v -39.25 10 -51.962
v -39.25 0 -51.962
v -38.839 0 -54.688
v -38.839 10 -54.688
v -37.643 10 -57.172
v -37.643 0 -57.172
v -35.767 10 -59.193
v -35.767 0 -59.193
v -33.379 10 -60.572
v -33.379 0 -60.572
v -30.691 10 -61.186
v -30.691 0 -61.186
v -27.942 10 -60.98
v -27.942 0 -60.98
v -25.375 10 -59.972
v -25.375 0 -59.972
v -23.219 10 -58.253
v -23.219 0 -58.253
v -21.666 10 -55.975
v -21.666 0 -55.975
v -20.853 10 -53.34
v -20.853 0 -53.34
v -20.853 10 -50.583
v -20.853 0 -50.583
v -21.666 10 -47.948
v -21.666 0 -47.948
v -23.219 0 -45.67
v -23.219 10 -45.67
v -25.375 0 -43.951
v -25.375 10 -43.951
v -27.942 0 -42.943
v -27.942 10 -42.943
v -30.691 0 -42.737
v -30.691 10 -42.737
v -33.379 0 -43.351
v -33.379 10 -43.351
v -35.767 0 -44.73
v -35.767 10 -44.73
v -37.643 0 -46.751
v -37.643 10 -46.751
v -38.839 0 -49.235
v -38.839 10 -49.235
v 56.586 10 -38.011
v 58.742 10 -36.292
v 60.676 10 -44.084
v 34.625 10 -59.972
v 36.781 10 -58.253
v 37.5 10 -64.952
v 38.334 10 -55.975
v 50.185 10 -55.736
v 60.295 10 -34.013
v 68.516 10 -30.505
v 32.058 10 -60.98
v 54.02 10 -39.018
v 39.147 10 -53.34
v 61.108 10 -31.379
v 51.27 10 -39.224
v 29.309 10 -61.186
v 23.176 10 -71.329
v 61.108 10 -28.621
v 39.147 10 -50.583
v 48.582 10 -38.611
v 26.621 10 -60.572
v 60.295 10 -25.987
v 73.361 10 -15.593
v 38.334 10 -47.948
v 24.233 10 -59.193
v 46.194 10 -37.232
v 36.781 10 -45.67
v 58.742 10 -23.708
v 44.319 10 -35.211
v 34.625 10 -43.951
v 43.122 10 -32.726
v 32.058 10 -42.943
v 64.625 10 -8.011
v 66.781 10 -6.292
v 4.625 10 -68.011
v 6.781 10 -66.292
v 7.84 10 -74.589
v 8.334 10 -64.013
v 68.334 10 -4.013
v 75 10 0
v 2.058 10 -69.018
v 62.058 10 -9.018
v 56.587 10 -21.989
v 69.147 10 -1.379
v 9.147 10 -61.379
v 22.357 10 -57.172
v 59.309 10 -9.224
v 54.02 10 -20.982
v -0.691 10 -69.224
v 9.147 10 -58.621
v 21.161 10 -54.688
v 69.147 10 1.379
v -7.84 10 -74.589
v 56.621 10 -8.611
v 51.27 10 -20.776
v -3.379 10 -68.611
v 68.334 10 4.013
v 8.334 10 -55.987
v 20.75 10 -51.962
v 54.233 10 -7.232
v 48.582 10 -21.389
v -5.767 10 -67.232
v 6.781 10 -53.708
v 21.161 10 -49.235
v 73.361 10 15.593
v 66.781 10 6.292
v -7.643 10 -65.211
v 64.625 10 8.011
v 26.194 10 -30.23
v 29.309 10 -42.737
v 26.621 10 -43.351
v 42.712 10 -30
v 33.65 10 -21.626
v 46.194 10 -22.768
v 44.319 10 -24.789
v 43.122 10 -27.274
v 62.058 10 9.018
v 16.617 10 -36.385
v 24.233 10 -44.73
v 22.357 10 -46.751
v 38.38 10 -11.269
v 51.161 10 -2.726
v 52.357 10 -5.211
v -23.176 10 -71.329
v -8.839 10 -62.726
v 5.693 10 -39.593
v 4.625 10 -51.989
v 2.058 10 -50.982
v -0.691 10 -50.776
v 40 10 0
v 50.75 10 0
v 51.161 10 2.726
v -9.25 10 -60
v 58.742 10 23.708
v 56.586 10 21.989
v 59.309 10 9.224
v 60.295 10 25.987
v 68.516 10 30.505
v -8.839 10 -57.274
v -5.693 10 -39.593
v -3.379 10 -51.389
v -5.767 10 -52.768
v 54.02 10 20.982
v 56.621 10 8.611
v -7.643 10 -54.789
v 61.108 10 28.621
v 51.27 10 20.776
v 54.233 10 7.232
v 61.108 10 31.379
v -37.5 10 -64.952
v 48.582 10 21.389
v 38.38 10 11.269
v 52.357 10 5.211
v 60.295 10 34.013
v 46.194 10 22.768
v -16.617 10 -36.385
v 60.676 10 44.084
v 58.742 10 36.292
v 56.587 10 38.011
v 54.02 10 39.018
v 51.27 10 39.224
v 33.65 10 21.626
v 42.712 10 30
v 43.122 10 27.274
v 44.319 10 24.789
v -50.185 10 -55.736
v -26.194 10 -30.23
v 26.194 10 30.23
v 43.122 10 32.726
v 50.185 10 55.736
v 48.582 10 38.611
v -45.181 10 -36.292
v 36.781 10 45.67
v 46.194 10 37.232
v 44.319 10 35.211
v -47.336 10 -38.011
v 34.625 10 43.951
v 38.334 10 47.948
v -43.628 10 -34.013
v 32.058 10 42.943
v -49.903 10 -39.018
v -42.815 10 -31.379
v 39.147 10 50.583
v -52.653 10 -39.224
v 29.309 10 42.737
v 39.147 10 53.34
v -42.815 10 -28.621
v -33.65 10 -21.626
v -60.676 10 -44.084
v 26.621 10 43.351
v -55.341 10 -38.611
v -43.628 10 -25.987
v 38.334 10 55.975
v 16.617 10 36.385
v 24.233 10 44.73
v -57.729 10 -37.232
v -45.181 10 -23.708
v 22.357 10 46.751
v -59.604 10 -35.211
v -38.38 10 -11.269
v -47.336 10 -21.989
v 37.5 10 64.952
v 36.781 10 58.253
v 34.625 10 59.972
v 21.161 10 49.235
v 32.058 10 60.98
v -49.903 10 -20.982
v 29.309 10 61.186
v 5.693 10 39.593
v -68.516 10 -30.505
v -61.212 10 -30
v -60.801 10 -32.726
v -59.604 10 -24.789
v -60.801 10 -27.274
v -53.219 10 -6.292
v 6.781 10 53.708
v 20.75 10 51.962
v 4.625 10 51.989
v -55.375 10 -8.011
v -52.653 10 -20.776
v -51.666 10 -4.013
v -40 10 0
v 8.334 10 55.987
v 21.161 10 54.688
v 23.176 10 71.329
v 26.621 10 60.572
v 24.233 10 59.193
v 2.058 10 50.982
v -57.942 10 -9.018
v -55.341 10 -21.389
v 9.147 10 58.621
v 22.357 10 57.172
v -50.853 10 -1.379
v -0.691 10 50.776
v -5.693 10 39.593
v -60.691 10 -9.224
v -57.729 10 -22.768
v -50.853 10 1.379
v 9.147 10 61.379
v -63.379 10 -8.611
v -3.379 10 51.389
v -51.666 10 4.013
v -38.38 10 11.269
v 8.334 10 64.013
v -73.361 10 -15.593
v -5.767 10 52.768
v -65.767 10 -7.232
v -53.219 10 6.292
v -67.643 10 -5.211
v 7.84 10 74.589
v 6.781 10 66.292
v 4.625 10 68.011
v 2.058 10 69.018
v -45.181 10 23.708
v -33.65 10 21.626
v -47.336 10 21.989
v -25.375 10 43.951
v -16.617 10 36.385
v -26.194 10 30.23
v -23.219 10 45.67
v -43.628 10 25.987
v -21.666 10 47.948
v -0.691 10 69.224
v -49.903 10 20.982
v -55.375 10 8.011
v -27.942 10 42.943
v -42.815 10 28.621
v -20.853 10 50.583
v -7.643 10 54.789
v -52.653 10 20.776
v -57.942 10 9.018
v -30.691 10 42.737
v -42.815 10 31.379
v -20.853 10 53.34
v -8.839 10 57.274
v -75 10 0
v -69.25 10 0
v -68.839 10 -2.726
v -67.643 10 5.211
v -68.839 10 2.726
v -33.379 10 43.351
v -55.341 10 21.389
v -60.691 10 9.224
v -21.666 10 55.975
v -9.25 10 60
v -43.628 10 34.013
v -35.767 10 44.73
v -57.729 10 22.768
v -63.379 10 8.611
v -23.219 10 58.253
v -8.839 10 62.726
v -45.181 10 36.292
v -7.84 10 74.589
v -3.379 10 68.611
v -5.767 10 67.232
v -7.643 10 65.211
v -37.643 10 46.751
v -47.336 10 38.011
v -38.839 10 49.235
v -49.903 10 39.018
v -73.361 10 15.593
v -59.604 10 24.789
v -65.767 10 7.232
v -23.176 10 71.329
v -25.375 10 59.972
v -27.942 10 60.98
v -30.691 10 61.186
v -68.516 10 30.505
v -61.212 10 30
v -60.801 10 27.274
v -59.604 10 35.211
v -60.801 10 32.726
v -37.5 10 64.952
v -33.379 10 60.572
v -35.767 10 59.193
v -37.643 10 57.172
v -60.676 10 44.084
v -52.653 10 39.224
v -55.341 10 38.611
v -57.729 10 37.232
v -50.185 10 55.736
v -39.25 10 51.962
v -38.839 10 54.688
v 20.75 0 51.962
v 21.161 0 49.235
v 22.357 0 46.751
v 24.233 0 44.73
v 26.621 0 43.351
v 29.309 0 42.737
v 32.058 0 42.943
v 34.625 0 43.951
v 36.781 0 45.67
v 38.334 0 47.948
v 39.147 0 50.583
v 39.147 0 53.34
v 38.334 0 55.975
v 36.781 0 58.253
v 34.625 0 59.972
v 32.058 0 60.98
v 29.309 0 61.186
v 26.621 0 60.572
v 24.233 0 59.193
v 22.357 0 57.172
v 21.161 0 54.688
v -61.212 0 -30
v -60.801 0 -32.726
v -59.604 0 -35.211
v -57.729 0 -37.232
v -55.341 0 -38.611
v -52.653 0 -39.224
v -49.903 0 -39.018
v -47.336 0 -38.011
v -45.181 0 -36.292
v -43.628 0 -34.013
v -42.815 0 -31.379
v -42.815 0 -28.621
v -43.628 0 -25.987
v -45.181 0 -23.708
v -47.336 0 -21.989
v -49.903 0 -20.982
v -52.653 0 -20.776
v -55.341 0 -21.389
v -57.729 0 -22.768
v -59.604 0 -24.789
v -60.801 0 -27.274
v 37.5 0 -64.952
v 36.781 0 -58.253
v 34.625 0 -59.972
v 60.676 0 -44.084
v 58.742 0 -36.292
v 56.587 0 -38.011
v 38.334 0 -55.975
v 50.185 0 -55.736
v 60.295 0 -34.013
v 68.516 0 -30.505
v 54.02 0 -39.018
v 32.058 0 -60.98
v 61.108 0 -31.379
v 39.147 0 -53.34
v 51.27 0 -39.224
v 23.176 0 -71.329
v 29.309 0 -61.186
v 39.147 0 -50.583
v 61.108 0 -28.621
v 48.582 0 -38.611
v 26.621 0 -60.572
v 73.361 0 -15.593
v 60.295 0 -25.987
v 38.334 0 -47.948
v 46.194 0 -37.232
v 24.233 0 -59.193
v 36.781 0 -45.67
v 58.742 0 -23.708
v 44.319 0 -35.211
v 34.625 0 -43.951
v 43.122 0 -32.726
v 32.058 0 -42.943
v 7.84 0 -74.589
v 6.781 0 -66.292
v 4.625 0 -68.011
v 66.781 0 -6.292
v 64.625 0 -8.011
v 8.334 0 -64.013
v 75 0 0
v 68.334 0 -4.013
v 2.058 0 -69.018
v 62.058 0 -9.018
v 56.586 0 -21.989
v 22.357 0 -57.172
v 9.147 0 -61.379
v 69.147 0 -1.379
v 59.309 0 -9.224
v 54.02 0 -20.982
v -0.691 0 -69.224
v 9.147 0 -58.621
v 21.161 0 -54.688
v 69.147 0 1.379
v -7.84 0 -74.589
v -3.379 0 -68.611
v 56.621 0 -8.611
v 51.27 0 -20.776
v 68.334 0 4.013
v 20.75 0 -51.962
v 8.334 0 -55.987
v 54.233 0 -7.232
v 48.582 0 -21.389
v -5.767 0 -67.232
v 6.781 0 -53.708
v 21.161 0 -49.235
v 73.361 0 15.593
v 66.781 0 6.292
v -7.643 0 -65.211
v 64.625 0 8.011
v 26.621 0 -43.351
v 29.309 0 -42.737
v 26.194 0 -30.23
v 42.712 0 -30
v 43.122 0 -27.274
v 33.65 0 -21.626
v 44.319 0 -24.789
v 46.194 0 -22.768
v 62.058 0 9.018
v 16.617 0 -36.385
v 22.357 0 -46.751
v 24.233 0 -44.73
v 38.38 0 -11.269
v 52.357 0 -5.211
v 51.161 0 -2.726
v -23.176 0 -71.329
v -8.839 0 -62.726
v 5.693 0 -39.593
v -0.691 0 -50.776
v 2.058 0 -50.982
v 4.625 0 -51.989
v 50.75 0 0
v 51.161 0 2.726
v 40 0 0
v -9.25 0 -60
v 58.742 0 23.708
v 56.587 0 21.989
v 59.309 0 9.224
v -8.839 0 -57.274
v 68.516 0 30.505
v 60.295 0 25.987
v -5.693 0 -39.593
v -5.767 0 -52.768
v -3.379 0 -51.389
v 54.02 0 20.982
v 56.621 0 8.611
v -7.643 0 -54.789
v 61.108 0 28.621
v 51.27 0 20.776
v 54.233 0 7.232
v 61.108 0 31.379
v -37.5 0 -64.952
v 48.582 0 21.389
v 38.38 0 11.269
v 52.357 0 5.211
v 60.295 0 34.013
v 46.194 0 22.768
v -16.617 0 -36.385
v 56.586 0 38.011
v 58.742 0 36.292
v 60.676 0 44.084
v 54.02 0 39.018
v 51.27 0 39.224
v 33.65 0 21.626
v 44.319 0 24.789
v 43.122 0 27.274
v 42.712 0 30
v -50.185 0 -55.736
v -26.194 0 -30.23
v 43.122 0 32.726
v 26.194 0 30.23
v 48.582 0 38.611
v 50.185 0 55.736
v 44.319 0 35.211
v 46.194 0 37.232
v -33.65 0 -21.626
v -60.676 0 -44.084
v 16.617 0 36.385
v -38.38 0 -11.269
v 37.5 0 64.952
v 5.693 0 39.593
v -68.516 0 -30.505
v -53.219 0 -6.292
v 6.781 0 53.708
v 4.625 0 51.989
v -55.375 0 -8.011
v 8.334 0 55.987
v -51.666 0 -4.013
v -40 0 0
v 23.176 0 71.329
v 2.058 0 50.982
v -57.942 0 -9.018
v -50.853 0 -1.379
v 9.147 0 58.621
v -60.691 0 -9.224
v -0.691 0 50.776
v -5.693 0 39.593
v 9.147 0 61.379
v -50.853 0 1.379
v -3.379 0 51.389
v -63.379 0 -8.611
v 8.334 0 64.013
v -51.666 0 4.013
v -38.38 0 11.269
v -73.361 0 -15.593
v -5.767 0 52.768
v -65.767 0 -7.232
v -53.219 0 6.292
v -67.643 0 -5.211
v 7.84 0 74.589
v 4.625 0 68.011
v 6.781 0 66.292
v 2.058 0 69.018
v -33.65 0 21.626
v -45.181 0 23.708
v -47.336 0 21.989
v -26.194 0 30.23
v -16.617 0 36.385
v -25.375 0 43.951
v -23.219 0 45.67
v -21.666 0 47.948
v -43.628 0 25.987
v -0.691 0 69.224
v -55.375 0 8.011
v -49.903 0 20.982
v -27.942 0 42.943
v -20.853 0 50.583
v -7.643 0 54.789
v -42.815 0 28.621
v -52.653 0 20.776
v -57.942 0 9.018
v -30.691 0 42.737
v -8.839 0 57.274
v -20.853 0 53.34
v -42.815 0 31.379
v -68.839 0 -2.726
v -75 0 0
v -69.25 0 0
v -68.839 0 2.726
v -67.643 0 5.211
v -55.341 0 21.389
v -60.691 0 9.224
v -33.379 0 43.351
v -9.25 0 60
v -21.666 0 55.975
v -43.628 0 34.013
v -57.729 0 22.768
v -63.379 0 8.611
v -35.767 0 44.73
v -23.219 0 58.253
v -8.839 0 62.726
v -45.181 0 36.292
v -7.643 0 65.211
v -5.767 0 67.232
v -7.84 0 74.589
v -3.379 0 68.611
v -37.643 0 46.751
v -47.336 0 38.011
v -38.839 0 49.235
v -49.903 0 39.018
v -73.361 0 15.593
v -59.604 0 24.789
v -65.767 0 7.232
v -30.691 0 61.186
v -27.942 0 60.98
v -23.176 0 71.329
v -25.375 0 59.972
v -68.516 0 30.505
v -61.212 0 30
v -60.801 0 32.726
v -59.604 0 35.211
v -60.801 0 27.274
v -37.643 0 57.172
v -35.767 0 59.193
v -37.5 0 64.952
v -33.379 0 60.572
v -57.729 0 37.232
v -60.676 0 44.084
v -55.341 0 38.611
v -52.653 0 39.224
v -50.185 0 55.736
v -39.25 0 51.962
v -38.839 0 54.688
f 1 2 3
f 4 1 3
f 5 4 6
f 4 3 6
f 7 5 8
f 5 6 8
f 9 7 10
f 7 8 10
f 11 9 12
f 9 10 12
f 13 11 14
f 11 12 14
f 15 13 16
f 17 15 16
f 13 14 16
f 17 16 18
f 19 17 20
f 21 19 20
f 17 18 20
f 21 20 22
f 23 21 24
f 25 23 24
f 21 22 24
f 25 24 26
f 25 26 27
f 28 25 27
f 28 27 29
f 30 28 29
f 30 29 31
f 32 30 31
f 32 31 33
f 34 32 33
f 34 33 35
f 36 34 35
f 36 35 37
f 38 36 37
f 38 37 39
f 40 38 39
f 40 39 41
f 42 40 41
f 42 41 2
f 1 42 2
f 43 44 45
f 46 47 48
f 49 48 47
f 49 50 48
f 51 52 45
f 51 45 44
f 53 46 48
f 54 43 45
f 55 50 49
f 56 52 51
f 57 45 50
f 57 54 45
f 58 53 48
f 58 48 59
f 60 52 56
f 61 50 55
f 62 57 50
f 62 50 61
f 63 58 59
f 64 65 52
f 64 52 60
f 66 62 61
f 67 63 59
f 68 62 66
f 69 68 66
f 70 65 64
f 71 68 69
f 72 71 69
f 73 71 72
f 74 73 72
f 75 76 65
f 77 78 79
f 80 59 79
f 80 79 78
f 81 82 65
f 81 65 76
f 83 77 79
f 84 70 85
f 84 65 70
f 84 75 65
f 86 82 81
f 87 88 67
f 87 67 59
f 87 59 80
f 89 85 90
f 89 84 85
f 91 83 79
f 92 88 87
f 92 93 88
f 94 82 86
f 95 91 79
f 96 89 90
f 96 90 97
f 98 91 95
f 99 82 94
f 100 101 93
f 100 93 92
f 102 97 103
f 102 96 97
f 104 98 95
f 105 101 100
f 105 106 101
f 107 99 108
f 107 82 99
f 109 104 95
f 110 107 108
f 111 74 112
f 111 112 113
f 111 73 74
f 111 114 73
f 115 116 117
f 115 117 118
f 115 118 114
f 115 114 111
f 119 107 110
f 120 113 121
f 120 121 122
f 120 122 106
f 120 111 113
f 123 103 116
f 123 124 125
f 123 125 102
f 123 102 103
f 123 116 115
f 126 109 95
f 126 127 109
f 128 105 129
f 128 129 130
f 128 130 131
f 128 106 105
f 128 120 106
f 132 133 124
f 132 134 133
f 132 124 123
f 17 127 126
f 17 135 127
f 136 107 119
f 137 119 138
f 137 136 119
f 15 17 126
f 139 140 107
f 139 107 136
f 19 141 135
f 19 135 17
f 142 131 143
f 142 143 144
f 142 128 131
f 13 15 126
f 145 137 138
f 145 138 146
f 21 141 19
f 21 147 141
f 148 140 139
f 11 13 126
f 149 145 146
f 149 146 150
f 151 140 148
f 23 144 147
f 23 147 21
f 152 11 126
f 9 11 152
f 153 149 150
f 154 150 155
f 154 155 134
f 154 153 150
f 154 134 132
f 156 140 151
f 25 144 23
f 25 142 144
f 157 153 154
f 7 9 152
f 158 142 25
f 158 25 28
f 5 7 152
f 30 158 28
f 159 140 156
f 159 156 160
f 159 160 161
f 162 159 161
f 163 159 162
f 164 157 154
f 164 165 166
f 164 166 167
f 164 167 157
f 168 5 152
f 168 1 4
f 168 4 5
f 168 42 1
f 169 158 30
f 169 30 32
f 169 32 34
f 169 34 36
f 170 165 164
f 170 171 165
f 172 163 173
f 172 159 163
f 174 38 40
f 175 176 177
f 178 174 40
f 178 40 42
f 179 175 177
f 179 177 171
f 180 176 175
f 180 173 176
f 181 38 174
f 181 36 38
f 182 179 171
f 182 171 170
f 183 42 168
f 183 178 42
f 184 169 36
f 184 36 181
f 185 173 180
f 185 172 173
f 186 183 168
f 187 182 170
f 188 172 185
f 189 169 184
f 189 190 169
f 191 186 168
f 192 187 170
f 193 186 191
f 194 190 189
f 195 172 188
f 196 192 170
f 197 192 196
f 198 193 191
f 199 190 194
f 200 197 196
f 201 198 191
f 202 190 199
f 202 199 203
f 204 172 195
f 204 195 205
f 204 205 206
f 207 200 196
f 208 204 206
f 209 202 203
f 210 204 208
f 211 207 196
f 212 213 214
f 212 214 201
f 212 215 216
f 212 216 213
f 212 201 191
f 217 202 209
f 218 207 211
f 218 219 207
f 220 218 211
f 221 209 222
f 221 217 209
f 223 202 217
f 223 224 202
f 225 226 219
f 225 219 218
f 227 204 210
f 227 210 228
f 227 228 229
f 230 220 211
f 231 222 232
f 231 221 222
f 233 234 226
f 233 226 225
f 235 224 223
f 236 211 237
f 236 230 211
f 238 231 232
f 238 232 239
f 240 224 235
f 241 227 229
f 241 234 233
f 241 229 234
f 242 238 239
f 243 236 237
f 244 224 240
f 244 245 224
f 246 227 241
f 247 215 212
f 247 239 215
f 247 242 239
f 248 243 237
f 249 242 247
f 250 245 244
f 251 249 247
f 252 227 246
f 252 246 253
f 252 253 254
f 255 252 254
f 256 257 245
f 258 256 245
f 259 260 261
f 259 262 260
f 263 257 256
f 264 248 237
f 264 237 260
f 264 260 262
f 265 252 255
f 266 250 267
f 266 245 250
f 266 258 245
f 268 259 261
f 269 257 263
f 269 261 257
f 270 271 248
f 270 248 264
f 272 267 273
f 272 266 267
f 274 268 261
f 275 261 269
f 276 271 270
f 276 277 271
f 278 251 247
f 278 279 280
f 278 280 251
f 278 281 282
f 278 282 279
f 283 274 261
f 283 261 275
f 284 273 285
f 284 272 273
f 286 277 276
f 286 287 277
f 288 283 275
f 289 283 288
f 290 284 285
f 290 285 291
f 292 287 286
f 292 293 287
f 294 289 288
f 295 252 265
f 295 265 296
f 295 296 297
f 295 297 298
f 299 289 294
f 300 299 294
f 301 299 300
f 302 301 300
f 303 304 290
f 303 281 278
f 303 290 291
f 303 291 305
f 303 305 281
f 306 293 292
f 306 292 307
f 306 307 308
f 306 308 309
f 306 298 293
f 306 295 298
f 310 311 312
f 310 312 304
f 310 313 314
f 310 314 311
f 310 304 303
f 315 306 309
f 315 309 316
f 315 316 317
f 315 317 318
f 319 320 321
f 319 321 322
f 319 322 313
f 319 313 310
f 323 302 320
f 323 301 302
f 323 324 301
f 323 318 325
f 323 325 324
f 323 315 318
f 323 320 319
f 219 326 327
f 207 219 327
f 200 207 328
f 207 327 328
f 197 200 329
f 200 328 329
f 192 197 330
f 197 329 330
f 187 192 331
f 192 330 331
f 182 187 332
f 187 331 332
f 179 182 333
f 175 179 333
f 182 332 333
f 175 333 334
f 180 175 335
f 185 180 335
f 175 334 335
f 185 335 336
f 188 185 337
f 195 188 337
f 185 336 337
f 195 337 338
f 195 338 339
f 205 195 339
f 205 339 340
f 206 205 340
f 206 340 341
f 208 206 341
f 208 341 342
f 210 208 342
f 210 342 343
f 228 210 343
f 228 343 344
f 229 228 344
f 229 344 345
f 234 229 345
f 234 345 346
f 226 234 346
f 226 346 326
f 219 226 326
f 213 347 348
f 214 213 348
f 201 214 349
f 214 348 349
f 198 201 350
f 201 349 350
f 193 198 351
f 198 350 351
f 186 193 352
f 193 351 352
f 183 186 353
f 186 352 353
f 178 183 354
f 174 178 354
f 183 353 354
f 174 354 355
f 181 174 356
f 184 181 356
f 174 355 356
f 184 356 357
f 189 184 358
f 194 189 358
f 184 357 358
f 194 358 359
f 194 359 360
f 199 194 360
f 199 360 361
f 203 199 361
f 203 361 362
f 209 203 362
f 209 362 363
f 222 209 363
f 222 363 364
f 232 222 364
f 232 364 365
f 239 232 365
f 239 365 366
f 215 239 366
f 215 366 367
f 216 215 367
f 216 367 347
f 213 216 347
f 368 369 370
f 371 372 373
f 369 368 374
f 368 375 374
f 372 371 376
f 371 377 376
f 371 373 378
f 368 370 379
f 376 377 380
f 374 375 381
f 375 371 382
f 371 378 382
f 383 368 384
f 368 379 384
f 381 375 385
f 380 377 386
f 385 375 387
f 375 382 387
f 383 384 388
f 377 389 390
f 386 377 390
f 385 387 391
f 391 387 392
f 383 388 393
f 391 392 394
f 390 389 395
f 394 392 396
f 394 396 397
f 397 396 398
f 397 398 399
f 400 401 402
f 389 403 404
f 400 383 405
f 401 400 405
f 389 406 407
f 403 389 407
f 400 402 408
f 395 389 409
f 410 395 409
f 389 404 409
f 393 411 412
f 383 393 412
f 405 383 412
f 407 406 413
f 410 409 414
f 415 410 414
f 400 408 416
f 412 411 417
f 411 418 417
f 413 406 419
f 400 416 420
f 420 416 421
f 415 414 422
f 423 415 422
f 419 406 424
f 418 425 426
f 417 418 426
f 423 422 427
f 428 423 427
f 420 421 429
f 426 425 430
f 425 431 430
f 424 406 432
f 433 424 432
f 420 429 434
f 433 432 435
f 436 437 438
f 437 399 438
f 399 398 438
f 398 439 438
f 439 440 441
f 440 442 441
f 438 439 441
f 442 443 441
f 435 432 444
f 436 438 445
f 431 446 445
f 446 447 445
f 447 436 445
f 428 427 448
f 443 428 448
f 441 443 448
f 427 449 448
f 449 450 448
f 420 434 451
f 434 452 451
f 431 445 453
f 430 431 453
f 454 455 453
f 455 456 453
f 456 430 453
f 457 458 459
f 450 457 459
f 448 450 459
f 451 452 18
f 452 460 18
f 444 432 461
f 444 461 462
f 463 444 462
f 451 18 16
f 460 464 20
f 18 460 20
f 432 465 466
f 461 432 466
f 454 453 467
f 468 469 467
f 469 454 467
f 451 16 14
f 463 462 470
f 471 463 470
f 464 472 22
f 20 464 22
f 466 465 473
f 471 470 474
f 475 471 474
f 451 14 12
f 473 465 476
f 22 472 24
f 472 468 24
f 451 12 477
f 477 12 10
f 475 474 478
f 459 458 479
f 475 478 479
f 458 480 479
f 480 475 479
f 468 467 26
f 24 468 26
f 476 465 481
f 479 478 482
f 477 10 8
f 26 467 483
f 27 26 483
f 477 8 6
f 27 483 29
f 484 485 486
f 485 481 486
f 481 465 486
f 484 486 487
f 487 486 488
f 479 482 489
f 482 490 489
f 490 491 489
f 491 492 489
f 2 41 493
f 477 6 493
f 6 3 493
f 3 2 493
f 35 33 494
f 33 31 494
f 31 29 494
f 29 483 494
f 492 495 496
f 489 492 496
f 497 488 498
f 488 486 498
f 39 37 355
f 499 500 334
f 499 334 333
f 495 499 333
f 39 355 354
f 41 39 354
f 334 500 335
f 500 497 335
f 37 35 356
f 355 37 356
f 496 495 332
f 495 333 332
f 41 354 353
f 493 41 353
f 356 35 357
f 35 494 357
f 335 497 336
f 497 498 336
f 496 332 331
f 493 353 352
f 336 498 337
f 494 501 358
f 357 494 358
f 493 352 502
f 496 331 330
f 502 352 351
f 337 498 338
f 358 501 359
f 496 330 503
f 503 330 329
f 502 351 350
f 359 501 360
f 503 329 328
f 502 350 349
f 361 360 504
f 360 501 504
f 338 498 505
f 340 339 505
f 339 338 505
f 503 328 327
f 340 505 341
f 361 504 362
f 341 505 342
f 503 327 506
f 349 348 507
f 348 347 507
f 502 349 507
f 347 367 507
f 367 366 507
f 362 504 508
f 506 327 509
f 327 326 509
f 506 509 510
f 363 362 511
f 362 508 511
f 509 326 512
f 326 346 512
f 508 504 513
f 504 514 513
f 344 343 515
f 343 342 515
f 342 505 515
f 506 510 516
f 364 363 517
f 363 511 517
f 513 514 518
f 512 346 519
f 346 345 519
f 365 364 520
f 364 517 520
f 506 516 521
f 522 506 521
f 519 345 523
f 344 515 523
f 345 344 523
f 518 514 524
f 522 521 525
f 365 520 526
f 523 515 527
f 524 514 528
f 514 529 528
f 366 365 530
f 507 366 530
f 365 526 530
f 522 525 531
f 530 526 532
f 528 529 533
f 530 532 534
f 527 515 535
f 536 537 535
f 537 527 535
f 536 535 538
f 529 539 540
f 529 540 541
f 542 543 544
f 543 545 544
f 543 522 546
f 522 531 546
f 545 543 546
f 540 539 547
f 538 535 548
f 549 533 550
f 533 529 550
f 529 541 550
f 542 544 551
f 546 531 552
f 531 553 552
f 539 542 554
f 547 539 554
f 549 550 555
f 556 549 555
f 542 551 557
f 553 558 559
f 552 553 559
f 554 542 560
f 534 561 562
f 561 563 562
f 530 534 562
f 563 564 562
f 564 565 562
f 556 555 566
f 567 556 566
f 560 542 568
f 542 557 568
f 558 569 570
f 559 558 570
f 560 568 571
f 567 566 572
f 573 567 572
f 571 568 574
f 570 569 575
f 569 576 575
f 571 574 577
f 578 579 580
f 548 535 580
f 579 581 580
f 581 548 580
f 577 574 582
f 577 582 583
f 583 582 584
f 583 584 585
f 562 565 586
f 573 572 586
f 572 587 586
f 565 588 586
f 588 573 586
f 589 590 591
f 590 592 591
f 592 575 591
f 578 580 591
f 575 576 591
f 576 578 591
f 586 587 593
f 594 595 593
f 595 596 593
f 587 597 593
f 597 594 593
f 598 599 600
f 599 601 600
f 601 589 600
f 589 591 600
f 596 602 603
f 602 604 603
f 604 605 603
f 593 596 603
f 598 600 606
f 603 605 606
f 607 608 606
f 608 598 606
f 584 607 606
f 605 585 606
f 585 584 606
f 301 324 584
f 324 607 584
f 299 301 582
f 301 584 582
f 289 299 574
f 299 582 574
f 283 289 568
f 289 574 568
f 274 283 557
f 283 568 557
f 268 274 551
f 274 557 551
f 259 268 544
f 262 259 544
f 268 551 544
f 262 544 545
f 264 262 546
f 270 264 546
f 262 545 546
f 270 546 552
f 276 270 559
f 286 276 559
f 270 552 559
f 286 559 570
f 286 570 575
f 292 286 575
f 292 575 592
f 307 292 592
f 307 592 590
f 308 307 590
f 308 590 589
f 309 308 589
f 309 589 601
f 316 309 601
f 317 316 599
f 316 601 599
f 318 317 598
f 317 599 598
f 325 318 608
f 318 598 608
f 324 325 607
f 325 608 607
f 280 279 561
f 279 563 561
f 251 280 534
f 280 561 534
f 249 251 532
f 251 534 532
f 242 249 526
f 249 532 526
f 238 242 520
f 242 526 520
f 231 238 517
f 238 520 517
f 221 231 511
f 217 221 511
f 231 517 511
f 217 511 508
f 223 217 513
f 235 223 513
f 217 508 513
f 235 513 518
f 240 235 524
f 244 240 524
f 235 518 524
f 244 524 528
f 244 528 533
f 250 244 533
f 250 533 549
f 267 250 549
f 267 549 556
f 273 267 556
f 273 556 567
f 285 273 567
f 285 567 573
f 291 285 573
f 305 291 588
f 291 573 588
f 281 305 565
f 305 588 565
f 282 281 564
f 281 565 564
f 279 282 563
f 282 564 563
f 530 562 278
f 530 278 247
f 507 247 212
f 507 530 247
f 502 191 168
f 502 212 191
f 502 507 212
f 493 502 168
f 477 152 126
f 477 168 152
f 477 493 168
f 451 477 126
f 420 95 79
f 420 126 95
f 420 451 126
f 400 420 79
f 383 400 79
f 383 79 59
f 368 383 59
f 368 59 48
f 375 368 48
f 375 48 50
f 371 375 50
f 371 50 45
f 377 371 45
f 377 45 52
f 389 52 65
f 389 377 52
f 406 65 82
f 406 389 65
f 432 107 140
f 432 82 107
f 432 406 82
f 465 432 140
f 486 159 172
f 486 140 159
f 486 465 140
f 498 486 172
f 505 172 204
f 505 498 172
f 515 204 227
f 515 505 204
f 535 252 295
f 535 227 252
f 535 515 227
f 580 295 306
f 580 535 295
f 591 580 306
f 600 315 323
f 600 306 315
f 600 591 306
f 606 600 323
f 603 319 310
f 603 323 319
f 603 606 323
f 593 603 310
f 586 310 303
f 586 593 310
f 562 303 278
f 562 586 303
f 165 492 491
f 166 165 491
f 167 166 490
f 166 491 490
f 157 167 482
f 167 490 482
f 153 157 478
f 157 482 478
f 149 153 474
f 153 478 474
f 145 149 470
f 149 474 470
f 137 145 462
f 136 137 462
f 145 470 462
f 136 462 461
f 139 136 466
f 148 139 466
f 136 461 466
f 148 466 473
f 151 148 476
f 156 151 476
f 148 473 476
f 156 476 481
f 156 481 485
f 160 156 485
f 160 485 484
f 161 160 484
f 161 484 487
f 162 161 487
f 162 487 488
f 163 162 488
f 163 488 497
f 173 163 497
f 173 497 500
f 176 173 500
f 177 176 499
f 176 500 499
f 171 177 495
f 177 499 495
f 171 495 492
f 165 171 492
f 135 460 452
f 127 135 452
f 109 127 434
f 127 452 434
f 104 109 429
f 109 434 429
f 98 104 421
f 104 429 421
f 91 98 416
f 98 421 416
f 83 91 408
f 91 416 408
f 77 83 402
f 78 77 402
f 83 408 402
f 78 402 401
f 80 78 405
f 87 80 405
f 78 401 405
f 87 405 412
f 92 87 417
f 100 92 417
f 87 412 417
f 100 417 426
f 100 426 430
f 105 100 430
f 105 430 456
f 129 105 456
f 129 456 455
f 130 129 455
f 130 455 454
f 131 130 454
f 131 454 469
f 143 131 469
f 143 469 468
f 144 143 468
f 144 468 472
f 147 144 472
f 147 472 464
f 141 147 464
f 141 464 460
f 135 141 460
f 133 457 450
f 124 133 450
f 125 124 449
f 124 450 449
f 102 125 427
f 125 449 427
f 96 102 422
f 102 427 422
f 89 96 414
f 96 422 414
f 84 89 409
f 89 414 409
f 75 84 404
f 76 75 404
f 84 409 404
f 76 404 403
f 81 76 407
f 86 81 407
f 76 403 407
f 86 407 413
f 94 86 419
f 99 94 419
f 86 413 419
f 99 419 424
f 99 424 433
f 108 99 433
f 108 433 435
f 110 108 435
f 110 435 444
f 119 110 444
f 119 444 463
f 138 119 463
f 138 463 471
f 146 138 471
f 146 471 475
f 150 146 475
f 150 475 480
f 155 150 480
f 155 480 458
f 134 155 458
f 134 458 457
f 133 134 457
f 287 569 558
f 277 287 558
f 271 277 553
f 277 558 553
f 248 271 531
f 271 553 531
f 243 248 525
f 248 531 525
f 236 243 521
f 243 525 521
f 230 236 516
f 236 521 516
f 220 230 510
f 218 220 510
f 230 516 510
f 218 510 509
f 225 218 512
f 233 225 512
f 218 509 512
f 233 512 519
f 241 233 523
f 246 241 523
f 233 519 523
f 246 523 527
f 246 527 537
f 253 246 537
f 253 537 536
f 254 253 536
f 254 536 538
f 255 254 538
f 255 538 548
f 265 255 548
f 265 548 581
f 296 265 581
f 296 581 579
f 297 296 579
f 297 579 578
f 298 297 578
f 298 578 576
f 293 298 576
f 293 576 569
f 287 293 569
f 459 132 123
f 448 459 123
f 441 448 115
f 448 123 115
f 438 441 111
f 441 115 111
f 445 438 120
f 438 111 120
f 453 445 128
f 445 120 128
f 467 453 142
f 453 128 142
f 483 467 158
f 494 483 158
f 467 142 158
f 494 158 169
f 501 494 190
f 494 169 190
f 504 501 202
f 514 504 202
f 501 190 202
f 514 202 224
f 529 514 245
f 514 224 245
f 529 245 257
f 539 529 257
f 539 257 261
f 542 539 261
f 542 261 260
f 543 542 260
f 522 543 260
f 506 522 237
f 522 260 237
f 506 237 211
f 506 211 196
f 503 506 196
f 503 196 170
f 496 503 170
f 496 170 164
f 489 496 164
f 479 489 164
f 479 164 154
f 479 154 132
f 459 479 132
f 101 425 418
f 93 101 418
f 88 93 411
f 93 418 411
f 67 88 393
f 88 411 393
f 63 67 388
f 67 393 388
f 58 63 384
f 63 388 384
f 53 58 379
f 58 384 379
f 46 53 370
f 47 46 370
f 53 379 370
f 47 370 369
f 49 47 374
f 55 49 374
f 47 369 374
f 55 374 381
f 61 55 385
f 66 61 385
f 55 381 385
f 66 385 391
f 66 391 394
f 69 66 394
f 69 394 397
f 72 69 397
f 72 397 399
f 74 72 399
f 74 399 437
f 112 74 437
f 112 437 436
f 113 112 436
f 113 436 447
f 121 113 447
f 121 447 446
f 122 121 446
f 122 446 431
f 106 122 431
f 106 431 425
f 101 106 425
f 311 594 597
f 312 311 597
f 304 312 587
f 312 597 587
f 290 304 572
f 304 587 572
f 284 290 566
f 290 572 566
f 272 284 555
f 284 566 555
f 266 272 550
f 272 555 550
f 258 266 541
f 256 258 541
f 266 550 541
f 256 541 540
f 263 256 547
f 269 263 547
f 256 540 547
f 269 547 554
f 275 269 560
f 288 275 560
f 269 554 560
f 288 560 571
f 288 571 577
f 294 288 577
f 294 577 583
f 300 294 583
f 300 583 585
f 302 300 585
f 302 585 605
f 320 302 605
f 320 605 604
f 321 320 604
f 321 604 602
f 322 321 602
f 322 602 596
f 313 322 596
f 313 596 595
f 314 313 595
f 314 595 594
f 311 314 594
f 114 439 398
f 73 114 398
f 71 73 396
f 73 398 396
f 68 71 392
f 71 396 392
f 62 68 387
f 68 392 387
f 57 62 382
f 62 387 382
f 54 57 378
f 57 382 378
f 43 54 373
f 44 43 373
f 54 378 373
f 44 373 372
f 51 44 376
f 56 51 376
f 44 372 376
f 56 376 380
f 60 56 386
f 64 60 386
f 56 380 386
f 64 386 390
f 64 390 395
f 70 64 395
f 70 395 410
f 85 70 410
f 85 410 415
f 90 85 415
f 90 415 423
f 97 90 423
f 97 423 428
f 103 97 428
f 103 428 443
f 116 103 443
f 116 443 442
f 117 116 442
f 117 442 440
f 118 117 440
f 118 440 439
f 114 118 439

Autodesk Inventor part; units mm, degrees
ref_plane "XZ Plane" through (0, 0, 0) normal (0, 1, 0) x (-1, 0, 0)
sketch "Sketch1" plane through (0, 0, 0) normal (0, 1, 0) x (-1, 0, 0)
  circle A0 centre (0, 0) radius 75
  circle A1 centre (0, 0) radius 60
  circle A2 centre (0, 60) radius 9.25
  circle A3 centre (-30, 51.9615) radius 9.25
  circle A4 centre (-51.9615, 30) radius 9.25
  circle A5 centre (-60, 0) radius 9.25
  circle A6 centre (-51.9615, -30) radius 9.25
  circle A7 centre (-30, -51.9615) radius 9.25
  circle A8 centre (0, -60) radius 9.25
  circle A9 centre (30, -51.9615) radius 9.25
  circle A10 centre (51.9615, -30) radius 9.25
  circle A11 centre (60, 0) radius 9.25
  circle A12 centre (51.9615, 30) radius 9.25
  circle A13 centre (30, 51.9615) radius 9.25
  dimension "d1" = 120
  dimension "d0" = 150
  dimension "d2" = 18.5
  dimension "d5" = 360
extrude "Extrusion1" add sketch "Sketch1" along normal blind 10 contours A0 | A11 A1 A10 A9 A8 A7 A6 A5 A4 A3 A2 A13 A12
sketch "Sketch2" plane through (0, 0, 0) normal (0, -1, 0) x (1, 0, 0)
  circle A0 centre (0, 0) radius 45
  dimension "d9" = 90
extrude "Extrusion2" add sketch "Sketch2" along normal blind 130
sketch "Sketch3" plane through (0, -130, 0) normal (0, -1, 0) x (1, 0, 0)
  circle A0 centre (0, 0) radius 5
  line L0 (-11.0031, 74.0969) -> (11.0031, 74.0969)
  line L1 (11.0031, 74.0969) -> (11.0031, 56.269)
  line L2 (11.0031, 56.269) -> (-11.0031, 56.269)
  line L3 (-11.0031, 56.269) -> (-11.0031, 74.0969)
  line L4 (11.0031, 74.0969) -> (0, 65.183) construction
  line L5 (-27.5195, 69.6713) -> (-18.6056, 54.232)
  line L6 (-18.6056, 54.232) -> (-37.6635, 43.2289)
  line L7 (-37.6635, 43.2289) -> (-46.5774, 58.6682)
  line L8 (-46.5774, 58.6682) -> (-27.5195, 69.6713)
  line L9 (-58.6682, 46.5774) -> (-43.2289, 37.6635)
  line L10 (-43.2289, 37.6635) -> (-54.232, 18.6056)
  line L11 (-54.232, 18.6056) -> (-69.6713, 27.5195)
  line L12 (-69.6713, 27.5195) -> (-58.6682, 46.5774)
  line L13 (-74.0969, 11.0031) -> (-56.269, 11.0031)
  line L14 (-56.269, 11.0031) -> (-56.269, -11.0031)
  line L15 (-56.269, -11.0031) -> (-74.0969, -11.0031)
  line L16 (-74.0969, -11.0031) -> (-74.0969, 11.0031)
  line L17 (-69.6713, -27.5195) -> (-54.232, -18.6056)
  line L18 (-54.232, -18.6056) -> (-43.2289, -37.6635)
  line L19 (-43.2289, -37.6635) -> (-58.6682, -46.5774)
  line L20 (-58.6682, -46.5774) -> (-69.6713, -27.5195)
  line L21 (-46.5774, -58.6682) -> (-37.6635, -43.2289)
  line L22 (-37.6635, -43.2289) -> (-18.6056, -54.232)
  line L23 (-18.6056, -54.232) -> (-27.5195, -69.6713)
  line L24 (-27.5195, -69.6713) -> (-46.5774, -58.6682)
  line L25 (-11.0031, -74.0969) -> (-11.0031, -56.269)
  line L26 (-11.0031, -56.269) -> (11.0031, -56.269)
  line L27 (11.0031, -56.269) -> (11.0031, -74.0969)
  line L28 (11.0031, -74.0969) -> (-11.0031, -74.0969)
  line L29 (27.5195, -69.6713) -> (18.6056, -54.232)
  line L30 (18.6056, -54.232) -> (37.6635, -43.2289)
  line L31 (37.6635, -43.2289) -> (46.5774, -58.6682)
  line L32 (46.5774, -58.6682) -> (27.5195, -69.6713)
  line L33 (58.6682, -46.5774) -> (43.2289, -37.6635)
  line L34 (43.2289, -37.6635) -> (54.232, -18.6056)
  line L35 (54.232, -18.6056) -> (69.6713, -27.5195)
  line L36 (69.6713, -27.5195) -> (58.6682, -46.5774)
  line L37 (74.0969, -11.0031) -> (56.269, -11.0031)
  line L38 (56.269, -11.0031) -> (56.269, 11.0031)
  line L39 (56.269, 11.0031) -> (74.0969, 11.0031)
  line L40 (74.0969, 11.0031) -> (74.0969, -11.0031)
  line L41 (69.6713, 27.5195) -> (54.232, 18.6056)
  line L42 (54.232, 18.6056) -> (43.2289, 37.6635)
  line L43 (43.2289, 37.6635) -> (58.6682, 46.5774)
  line L44 (58.6682, 46.5774) -> (69.6713, 27.5195)
  line L45 (46.5774, 58.6682) -> (37.6635, 43.2289)
  line L46 (37.6635, 43.2289) -> (18.6056, 54.232)
  line L47 (18.6056, 54.232) -> (27.5195, 69.6713)
  line L48 (27.5195, 69.6713) -> (46.5774, 58.6682)
  arc A1 (-11.0031, 60.9667) -> (-20.9544, 58.3003) centre (0, 0) ccw
  arc A2 (20.9544, 58.3003) -> (11.0031, 60.9667) centre (0, 0) ccw
  arc A3 (47.2972, 40.0123) -> (40.0123, 47.2972) centre (0, 0) ccw
  arc A4 (-40.0123, 47.2972) -> (-47.2972, 40.0123) centre (0, 0) ccw
  arc A5 (-58.3003, 20.9544) -> (-60.9667, 11.0031) centre (0, 0) ccw
  arc A6 (-60.9667, -11.0031) -> (-58.3003, -20.9544) centre (0, 0) ccw
  arc A7 (-47.2972, -40.0123) -> (-40.0123, -47.2972) centre (0, 0) ccw
  arc A8 (-20.9544, -58.3003) -> (-11.0031, -60.9667) centre (0, 0) ccw
  arc A9 (11.0031, -60.9667) -> (20.9544, -58.3003) centre (0, 0) ccw
  arc A10 (40.0123, -47.2972) -> (47.2972, -40.0123) centre (0, 0) ccw
  arc A11 (58.3003, -20.9544) -> (60.9667, -11.0031) centre (0, 0) ccw
  arc A12 (60.9667, 11.0031) -> (58.3003, 20.9544) centre (0, 0) ccw
  dimension "d68" = 360
extrude "Extrusion9" add sketch "Sketch3" along normal blind 10
sketch "Sketch7" plane through (0, -130, 0) normal (0, 1, 0) x (1, 0, 0)
  circle A0 centre (0, 0) radius 5 projected
  circle A1 centre (0, 0) radius 60
  circle A2 centre (-60, 0) radius 9.25
  circle A3 centre (-51.9615, -30) radius 9.25
  circle A4 centre (-30, -51.9615) radius 9.25
  circle A5 centre (0, -60) radius 9.25
  circle A6 centre (30, -51.9615) radius 9.25
  circle A7 centre (51.9615, -30) radius 9.25
  circle A8 centre (60, 0) radius 9.25
  circle A9 centre (51.9615, 30) radius 9.25
  circle A10 centre (30, 51.9615) radius 9.25
  circle A11 centre (0, 60) radius 9.25
  circle A12 centre (-30, 51.9615) radius 9.25
  circle A13 centre (-51.9615, 30) radius 9.25
  dimension "d71" = 120
  dimension "d72" = 18.5
  dimension "d75" = 360
extrude "Extrusion10" cut sketch "Sketch7" against normal blind 10 contours A1 A8 | A1 A8 | A9 A1 | A1 A9 | A7 A1 | A1 A7 | A10 A1 | A1 A10 | A6 A1 | A1 A6 | A11 A1 | A1 A11 | A5 A1 | A1 A5 | A12 A1 | A1 A12 | A4 A1 | A1 A4 | A13 A1 | A1 A13 | A3 A1 | A1 A3 | A2 A1 | A1 A2
sketch "Sketch8" plane through (0, 10, 0) normal (0, 1, 0) x (1, 0, 0)
  circle A0 centre (0, 0) radius 5 projected
  circle A1 centre (0, 0) radius 40
  dimension "d92" = 80
extrude "Extrusion11" cut sketch "Sketch8" against normal blind 140 contours A0 | A1
sketch "Sketch9" plane through (0, -140, 0) normal (0, -1, 0) x (1, 0, 0)
  circle A0 centre (0, 0) radius 100
  line L0 (0, 0) -> (18.5658, -69.2885)
  line L1 (0, 0) -> (0, -103.5276)
  arc A1 (24.6448, -72.6673) -> (14.9907, -75.2542) centre (0, 0) ccw
  circle A2 centre (25.8819, -96.5926) radius 5
  arc A3 (24.729, -72.9816) -> (15.0747, -75.5678) centre (19.8599, -74.1181) ccw
  line L2 (30.6777, -95.1782) -> (24.6448, -72.6673)
  line L3 (21.0523, -97.8867) -> (14.9907, -75.2542)
  circle A4 centre (0, -103.5276) radius 11.6229
  line L4 (21.0523, -97.8867) -> (25.8819, -96.5926)
  arc A5 (-25.8819, -96.5926) -> (26.7197, -101.5219) centre (0, -103.5276) ccw
  circle A6 centre (0, -103.5276) radius 40
  arc A7 (57.9067, -50.8394) -> (50.8389, -57.9063) centre (54.2582, -54.2582) ccw
  line L5 (67.1751, -74.2462) -> (50.6094, -57.6767)
  line L6 (74.1567, -67.0879) -> (57.6767, -50.6094)
  circle A8 centre (70.7107, -70.7107) radius 5
  circle A9 centre (51.7638, -89.6575) radius 11.6229
  arc A10 (75.5684, -15.0748) -> (72.9809, -24.7289) centre (74.1181, -19.8599) ccw
  line L7 (95.2985, -30.7115) -> (72.6673, -24.6448)
  line L8 (97.7655, -21.0214) -> (75.2542, -14.9907)
  circle A11 centre (96.5926, -25.8819) radius 5
  circle A12 centre (89.6575, -51.7638) radius 11.6229
  arc A13 (72.9816, 24.729) -> (75.5678, 15.0747) centre (74.1181, 19.8599) ccw
  line L9 (97.8867, 21.0523) -> (75.2542, 14.9907)
  line L10 (95.1782, 30.6777) -> (72.6673, 24.6448)
  circle A14 centre (96.5926, 25.8819) radius 5
  circle A15 centre (103.5276, 0) radius 11.6229
  arc A16 (50.8394, 57.9067) -> (57.9063, 50.8389) centre (54.2582, 54.2582) ccw
  line L11 (74.2462, 67.1751) -> (57.6767, 50.6094)
  line L12 (67.0879, 74.1567) -> (50.6094, 57.6767)
  circle A17 centre (70.7107, 70.7107) radius 5
  circle A18 centre (89.6575, 51.7638) radius 11.6229
  arc A19 (15.0748, 75.5684) -> (24.7289, 72.9809) centre (19.8599, 74.1181) ccw
  line L13 (30.7115, 95.2985) -> (24.6448, 72.6673)
  line L14 (21.0214, 97.7655) -> (14.9907, 75.2542)
  circle A20 centre (25.8819, 96.5926) radius 5
  circle A21 centre (51.7638, 89.6575) radius 11.6229
  arc A22 (-24.729, 72.9816) -> (-15.0747, 75.5678) centre (-19.8599, 74.1181) ccw
  line L15 (-21.0523, 97.8867) -> (-14.9907, 75.2542)
  line L16 (-30.6777, 95.1782) -> (-24.6448, 72.6673)
  circle A23 centre (-25.8819, 96.5926) radius 5
  circle A24 centre (0, 103.5276) radius 11.6229
  arc A25 (-57.9067, 50.8394) -> (-50.8389, 57.9063) centre (-54.2582, 54.2582) ccw
  line L17 (-67.1751, 74.2462) -> (-50.6094, 57.6767)
  line L18 (-74.1567, 67.0879) -> (-57.6767, 50.6094)
  circle A26 centre (-70.7107, 70.7107) radius 5
  circle A27 centre (-51.7638, 89.6575) radius 11.6229
  arc A28 (-75.5684, 15.0748) -> (-72.9809, 24.7289) centre (-74.1181, 19.8599) ccw
  line L19 (-95.2985, 30.7115) -> (-72.6673, 24.6448)
  line L20 (-97.7655, 21.0214) -> (-75.2542, 14.9907)
  circle A29 centre (-96.5926, 25.8819) radius 5
  circle A30 centre (-89.6575, 51.7638) radius 11.6229
  arc A31 (-72.9816, -24.729) -> (-75.5678, -15.0747) centre (-74.1181, -19.8599) ccw
  line L21 (-97.8867, -21.0523) -> (-75.2542, -14.9907)
  line L22 (-95.1782, -30.6777) -> (-72.6673, -24.6448)
  circle A32 centre (-96.5926, -25.8819) radius 5
  circle A33 centre (-103.5276, 0) radius 11.6229
  arc A34 (-50.8394, -57.9067) -> (-57.9063, -50.8389) centre (-54.2582, -54.2582) ccw
  line L23 (-74.2462, -67.1751) -> (-57.6767, -50.6094)
  line L24 (-67.0879, -74.1567) -> (-50.6094, -57.6767)
  circle A35 centre (-70.7107, -70.7107) radius 5
  circle A36 centre (-89.6575, -51.7638) radius 11.6229
  arc A37 (-15.0748, -75.5684) -> (-24.7289, -72.9809) centre (-19.8599, -74.1181) ccw
  line L25 (-30.7115, -95.2985) -> (-24.6448, -72.6673)
  line L26 (-21.0214, -97.7655) -> (-14.9907, -75.2542)
  circle A38 centre (-25.8819, -96.5926) radius 5
  circle A39 centre (-51.7638, -89.6575) radius 11.6229
  circle A40 centre (0, 0) radius 3
  circle A41 centre (0, -103.5276) radius 2.5
  point P0 (50.7227, -50.7227)
  point P1 (73.9009, -74.5607)
  point P2 (69.2885, -18.5658)
  point P3 (101.2804, -27.621)
  point P4 (69.2885, 18.5658)
  point P5 (101.5219, 26.7197)
  point P6 (50.7227, 50.7227)
  point P7 (74.5607, 73.9009)
  point P8 (18.5658, 69.2885)
  point P9 (27.621, 101.2804)
  point P10 (-18.5658, 69.2885)
  point P11 (-26.7197, 101.5219)
  point P12 (-50.7227, 50.7227)
  point P13 (-73.9009, 74.5607)
  point P14 (-69.2885, 18.5658)
  point P15 (-101.2804, 27.621)
  point P16 (-69.2885, -18.5658)
  point P17 (-101.5219, -26.7197)
  point P18 (-50.7227, -50.7227)
  point P19 (-74.5607, -73.9009)
  point P20 (-18.5658, -69.2885)
  point P21 (-27.621, -101.2804)
  point P22 (40.2917, -91.5236)
  point P23 (59.1159, -80.6555)
  point P24 (67.0867, -74.1578)
  point P25 (80.6555, -59.1159)
  point P26 (91.5236, -40.2917)
  point P27 (95.1777, -30.6791)
  point P28 (99.4077, -10.8682)
  point P29 (99.4077, 10.8682)
  point P30 (97.7659, 21.0199)
  point P31 (91.5236, 40.2917)
  point P32 (80.6555, 59.1159)
  point P33 (74.1578, 67.0867)
  point P34 (59.1159, 80.6555)
  point P35 (40.2917, 91.5236)
  point P36 (30.6791, 95.1777)
  point P37 (10.8682, 99.4077)
  point P38 (-10.8682, 99.4077)
  point P39 (-21.0199, 97.7659)
  point P40 (-40.2917, 91.5236)
  point P41 (-59.1159, 80.6555)
  point P42 (-67.0867, 74.1578)
  point P43 (-80.6555, 59.1159)
  point P44 (-91.5236, 40.2917)
  point P45 (-95.1777, 30.6791)
  point P46 (-99.4077, 10.8682)
  point P47 (-99.4077, -10.8682)
  point P48 (-97.7659, -21.0199)
  point P49 (-91.5236, -40.2917)
  point P50 (-80.6555, -59.1159)
  point P51 (-74.1578, -67.0867)
  point P52 (-59.1159, -80.6555)
  point P53 (-40.2917, -91.5236)
  point P54 (-30.6791, -95.1777)
  point P55 (-10.8682, -99.4077)
  point P56 (10.8682, -99.4077)
  point P57 (21.0199, -97.7659)
  point P58 (20.4557, -69.1537)
  point P59 (24.2422, -71.7107)
  point P60 (40.2917, -91.5236)
  point P61 (59.1159, -80.6555)
  point P62 (67.0867, -74.1578)
  point P63 (80.6555, -59.1159)
  point P64 (91.5236, -40.2917)
  point P65 (95.1777, -30.6791)
  point P66 (99.4077, -10.8682)
  point P67 (99.4077, 10.8682)
  point P68 (97.7659, 21.0199)
  point P69 (91.5236, 40.2917)
  point P70 (80.6555, 59.1159)
  point P71 (74.1578, 67.0867)
  point P72 (59.1159, 80.6555)
  point P73 (40.2917, 91.5236)
  point P74 (30.6791, 95.1777)
  point P75 (10.8682, 99.4077)
  point P76 (-10.8682, 99.4077)
  point P77 (-21.0199, 97.7659)
  point P78 (-40.2917, 91.5236)
  point P79 (-59.1159, 80.6555)
  point P80 (-67.0867, 74.1578)
  point P81 (-80.6555, 59.1159)
  point P82 (-91.5236, 40.2917)
  point P83 (-95.1782, 30.6777)
  point P84 (-99.4077, 10.8682)
  point P85 (-99.4077, -10.8682)
  point P86 (-97.7659, -21.0199)
  point P87 (-91.5236, -40.2917)
  point P88 (-80.6555, -59.1159)
  point P89 (-74.1578, -67.0867)
  point P90 (-59.1159, -80.6555)
  point P91 (-40.2917, -91.5236)
  point P92 (-30.6791, -95.1777)
  point P93 (-24.2422, -71.7107)
  point P94 (-20.4557, -69.1537)
  point P95 (-10.8682, -99.4077)
  point P96 (10.8682, -99.4077)
  point P97 (21.0199, -97.7659)
  dimension "d97" = 200
  dimension "d98" = 15
  dimension "d99" = 10
  dimension "d100" = 10
  dimension "d101" = 80
  dimension "d102" = 360
  dimension "d103" = 6
  dimension "d104" = 5
extrude "Extrusion12" add sketch "Sketch9" along normal blind 10 contours L26 A37 A1 L1 A4 A0 | A0 A6 A1 A37 L25 | A0 A39 L24 A34 A1 A6 | L1 A1 A3 L3 A0 A4 | A37 A6 L1 A1 | A6 A37 A1 | A1 A34 A31 A28 A25 A22 A19 A16 A13 A10 A7 A6 A3 L0 A40 L1 A37 | L1 A6 L0 A3 A1 | A6 A37 | A6 A1 A7 L5 A0 A9 | A0 L2 A3 A1 A6 | L1 A40 L0 A6 | L3 A3 | A34 L23 A0 A36 L22 A31 A1 | A1 A3 A6 | A40 L0 L1 | L1 L0 A40 | A6 A3 L0 | A6 A3 | A31 L21 A0 A33 L20 A28 A1 | A1 A10 L7 A0 A12 L6 A7 | A28 L20 A29 L19 A1 | A1 A28 | A28 L19 A0 A30 L18 A25 A1 | A1 A13 L9 A0 A15 L8 A10 | A25 L17 A0 A27 L16 A22 A1 | A1 A16 L11 A0 A18 L10 A13 | A22 L15 A0 A24 L14 A19 A1 | A1 A19 L13 A0 A21 L12 A16 picked at (-24.7526, -72.3861)
sketch "Sketch10" plane through (0, -140, 0) normal (0, 1, 0) x (1, 0, 0)
  arc A0 (20.4557, 69.1537) -> (24.2422, 71.7107) centre (0, 103.5276) ccw projected
  arc A1 (14.9907, 75.2542) -> (20.4557, 69.1537) centre (19.8599, 74.1181) ccw projected
  line L0 (21.0199, 97.7659) -> (14.9907, 75.2542) projected
  arc A2 (21.0199, 97.7659) -> (10.8682, 99.4077) centre (0, 0) ccw projected
  arc A3 (-10.8682, 99.4077) -> (10.8682, 99.4077) centre (0, 103.5276) ccw projected
  arc A4 (-10.8682, 99.4077) -> (-21.0214, 97.7655) centre (0, 0) ccw projected
  line L1 (-14.9907, 75.2542) -> (-21.0214, 97.7655) projected
  arc A5 (-20.4557, 69.1537) -> (-14.9907, 75.2542) centre (-19.8599, 74.1181) ccw projected
  arc A6 (-24.2422, 71.7107) -> (-20.4557, 69.1537) centre (0, 103.5276) ccw projected
  arc A7 (-24.6448, 72.6673) -> (-24.2422, 71.7107) centre (-19.8599, 74.1181) ccw projected
  line L2 (-30.6791, 95.1777) -> (-24.6448, 72.6673) projected
  arc A8 (-30.6791, 95.1777) -> (-40.2917, 91.5236) centre (0, 0) ccw projected
  arc A9 (-59.1159, 80.6555) -> (-40.2917, 91.5236) centre (-51.7638, 89.6575) ccw projected
  arc A10 (-59.1159, 80.6555) -> (-67.0879, 74.1567) centre (0, 0) ccw projected
  line L3 (-50.6094, 57.6767) -> (-67.0879, 74.1567) projected
  arc A11 (-57.6767, 50.6094) -> (-50.6094, 57.6767) centre (-54.2582, 54.2582) ccw projected
  line L4 (-74.1578, 67.0867) -> (-57.6767, 50.6094) projected
  arc A12 (-74.1578, 67.0867) -> (-80.6555, 59.1159) centre (0, 0) ccw projected
  arc A13 (-91.5236, 40.2917) -> (-80.6555, 59.1159) centre (-89.6575, 51.7638) ccw projected
  arc A14 (-91.5236, 40.2917) -> (-95.1782, 30.6777) centre (0, 0) ccw projected
  line L5 (-72.6673, 24.6448) -> (-95.1782, 30.6777) projected
  arc A15 (-75.2542, 14.9907) -> (-72.6673, 24.6448) centre (-74.1181, 19.8599) ccw projected
  line L6 (-97.7659, 21.0199) -> (-75.2542, 14.9907) projected
  arc A16 (-97.7659, 21.0199) -> (-99.4077, 10.8682) centre (0, 0) ccw projected
  arc A17 (-99.4077, -10.8682) -> (-99.4077, 10.8682) centre (-103.5276, 0) ccw projected
  arc A18 (-99.4077, -10.8682) -> (-97.7655, -21.0214) centre (0, 0) ccw projected
  arc A19 (-95.1782, -30.6777) -> (-97.7655, -21.0214) centre (-96.5926, -25.8819) ccw projected
  arc A20 (-95.1782, -30.6777) -> (-91.5236, -40.2917) centre (0, 0) ccw projected
  arc A21 (-80.6555, -59.1159) -> (-91.5236, -40.2917) centre (-89.6575, -51.7638) ccw projected
  arc A22 (-80.6555, -59.1159) -> (-74.1567, -67.0879) centre (0, 0) ccw projected
  line L7 (-57.6767, -50.6094) -> (-74.1567, -67.0879) projected
  arc A23 (-50.6094, -57.6767) -> (-57.6767, -50.6094) centre (-54.2582, -54.2582) ccw projected
  line L8 (-67.0867, -74.1578) -> (-50.6094, -57.6767) projected
  arc A24 (-67.0867, -74.1578) -> (-59.1159, -80.6555) centre (0, 0) ccw projected
  arc A25 (-40.2917, -91.5236) -> (-59.1159, -80.6555) centre (-51.7638, -89.6575) ccw projected
  arc A26 (-40.2917, -91.5236) -> (-30.6777, -95.1782) centre (0, 0) ccw projected
  line L9 (-24.6448, -72.6673) -> (-30.6777, -95.1782) projected
  arc A27 (-14.9907, -75.2542) -> (-24.6448, -72.6673) centre (-19.8599, -74.1181) ccw projected
  line L10 (-21.0199, -97.7659) -> (-14.9907, -75.2542) projected
  arc A28 (-21.0199, -97.7659) -> (-10.8682, -99.4077) centre (0, 0) ccw projected
  arc A29 (10.8682, -99.4077) -> (-10.8682, -99.4077) centre (0, -103.5276) ccw projected
  arc A30 (10.8682, -99.4077) -> (21.0214, -97.7655) centre (0, 0) ccw projected
  line L11 (14.9907, -75.2542) -> (21.0214, -97.7655) projected
  arc A31 (24.6448, -72.6673) -> (14.9907, -75.2542) centre (19.8599, -74.1181) ccw projected
  line L12 (30.6791, -95.1777) -> (24.6448, -72.6673) projected
  arc A32 (30.6791, -95.1777) -> (40.2917, -91.5236) centre (0, 0) ccw projected
  arc A33 (59.1159, -80.6555) -> (40.2917, -91.5236) centre (51.7638, -89.6575) ccw projected
  arc A34 (59.1159, -80.6555) -> (67.0879, -74.1567) centre (0, 0) ccw projected
  line L13 (50.6094, -57.6767) -> (67.0879, -74.1567) projected
  arc A35 (57.6767, -50.6094) -> (50.6094, -57.6767) centre (54.2582, -54.2582) ccw projected
  line L14 (74.1578, -67.0867) -> (57.6767, -50.6094) projected
  arc A36 (74.1578, -67.0867) -> (80.6555, -59.1159) centre (0, 0) ccw projected
  arc A37 (91.5236, -40.2917) -> (80.6555, -59.1159) centre (89.6575, -51.7638) ccw projected
  arc A38 (91.5236, -40.2917) -> (95.1782, -30.6777) centre (0, 0) ccw projected
  line L15 (72.6673, -24.6448) -> (95.1782, -30.6777) projected
  arc A39 (75.2542, -14.9907) -> (72.6673, -24.6448) centre (74.1181, -19.8599) ccw projected
  line L16 (97.7659, -21.0199) -> (75.2542, -14.9907) projected
  arc A40 (97.7659, -21.0199) -> (99.4077, -10.8682) centre (0, 0) ccw projected
  arc A41 (99.4077, 10.8682) -> (99.4077, -10.8682) centre (103.5276, 0) ccw projected
  arc A42 (99.4077, 10.8682) -> (97.7655, 21.0214) centre (0, 0) ccw projected
  line L17 (75.2542, 14.9907) -> (97.7655, 21.0214) projected
  arc A43 (72.6673, 24.6448) -> (75.2542, 14.9907) centre (74.1181, 19.8599) ccw projected
  line L18 (95.1777, 30.6791) -> (72.6673, 24.6448) projected
  arc A44 (95.1777, 30.6791) -> (91.5236, 40.2917) centre (0, 0) ccw projected
  arc A45 (80.6555, 59.1159) -> (91.5236, 40.2917) centre (89.6575, 51.7638) ccw projected
  arc A46 (80.6555, 59.1159) -> (74.1567, 67.0879) centre (0, 0) ccw projected
  line L19 (57.6767, 50.6094) -> (74.1567, 67.0879) projected
  arc A47 (50.6094, 57.6767) -> (57.6767, 50.6094) centre (54.2582, 54.2582) ccw projected
  line L20 (67.0867, 74.1578) -> (50.6094, 57.6767) projected
  arc A48 (67.0867, 74.1578) -> (59.1159, 80.6555) centre (0, 0) ccw projected
  arc A49 (40.2917, 91.5236) -> (59.1159, 80.6555) centre (51.7638, 89.6575) ccw projected
  arc A50 (40.2917, 91.5236) -> (30.6777, 95.1782) centre (0, 0) ccw projected
  line L21 (24.6448, 72.6673) -> (30.6777, 95.1782) projected
  arc A51 (24.2422, 71.7107) -> (24.6448, 72.6673) centre (19.8599, 74.1181) ccw projected
  line L22 (60.9667, 11.0031) -> (74.0969, 11.0031) projected
  line L23 (74.0969, 11.0031) -> (74.0969, -11.0031) projected
  line L24 (74.0969, -11.0031) -> (60.9667, -11.0031) projected
  arc A52 (58.3003, -20.9544) -> (60.9667, -11.0031) centre (0, 0) ccw projected
  line L25 (58.3003, -20.9544) -> (69.6713, -27.5195) projected
  line L26 (69.6713, -27.5195) -> (58.6682, -46.5774) projected
  line L27 (58.6682, -46.5774) -> (47.2972, -40.0123) projected
  arc A53 (40.0123, -47.2972) -> (47.2972, -40.0123) centre (0, 0) ccw projected
  line L28 (40.0123, -47.2972) -> (46.5774, -58.6682) projected
  line L29 (46.5774, -58.6682) -> (27.5195, -69.6713) projected
  line L30 (27.5195, -69.6713) -> (20.9544, -58.3003) projected
  arc A54 (11.0031, -60.9667) -> (20.9544, -58.3003) centre (0, 0) ccw projected
  line L31 (11.0031, -60.9667) -> (11.0031, -74.0969) projected
  line L32 (11.0031, -74.0969) -> (-11.0031, -74.0969) projected
  line L33 (-11.0031, -74.0969) -> (-11.0031, -60.9667) projected
  arc A55 (-20.9544, -58.3003) -> (-11.0031, -60.9667) centre (0, 0) ccw projected
  line L34 (-20.9544, -58.3003) -> (-27.5195, -69.6713) projected
  line L35 (-27.5195, -69.6713) -> (-46.5774, -58.6682) projected
  line L36 (-46.5774, -58.6682) -> (-40.0123, -47.2972) projected
  arc A56 (-47.2972, -40.0123) -> (-40.0123, -47.2972) centre (0, 0) ccw projected
  line L37 (-47.2972, -40.0123) -> (-58.6682, -46.5774) projected
  line L38 (-58.6682, -46.5774) -> (-69.6713, -27.5195) projected
  line L39 (-69.6713, -27.5195) -> (-58.3003, -20.9544) projected
  arc A57 (-60.9667, -11.0031) -> (-58.3003, -20.9544) centre (0, 0) ccw projected
  line L40 (-60.9667, -11.0031) -> (-74.0969, -11.0031) projected
  line L41 (-74.0969, -11.0031) -> (-74.0969, 11.0031) projected
  line L42 (-74.0969, 11.0031) -> (-60.9667, 11.0031) projected
  arc A58 (-58.3003, 20.9544) -> (-60.9667, 11.0031) centre (0, 0) ccw projected
  line L43 (-58.3003, 20.9544) -> (-69.6713, 27.5195) projected
  line L44 (-69.6713, 27.5195) -> (-58.6682, 46.5774) projected
  line L45 (-58.6682, 46.5774) -> (-47.2972, 40.0123) projected
  arc A59 (-40.0123, 47.2972) -> (-47.2972, 40.0123) centre (0, 0) ccw projected
  line L46 (-40.0123, 47.2972) -> (-46.5774, 58.6682) projected
  line L47 (-46.5774, 58.6682) -> (-27.5195, 69.6713) projected
  line L48 (-27.5195, 69.6713) -> (-20.9544, 58.3003) projected
  arc A60 (-11.0031, 60.9667) -> (-20.9544, 58.3003) centre (0, 0) ccw projected
  line L49 (-11.0031, 60.9667) -> (-11.0031, 74.0969) projected
  line L50 (-11.0031, 74.0969) -> (11.0031, 74.0969) projected
  line L51 (11.0031, 74.0969) -> (11.0031, 60.9667) projected
  arc A61 (20.9544, 58.3003) -> (11.0031, 60.9667) centre (0, 0) ccw projected
  line L52 (20.9544, 58.3003) -> (27.5195, 69.6713) projected
  line L53 (27.5195, 69.6713) -> (46.5774, 58.6682) projected
  line L54 (46.5774, 58.6682) -> (40.0123, 47.2972) projected
  arc A62 (47.2972, 40.0123) -> (40.0123, 47.2972) centre (0, 0) ccw projected
  line L55 (47.2972, 40.0123) -> (58.6682, 46.5774) projected
  line L56 (58.6682, 46.5774) -> (69.6713, 27.5195) projected
  line L57 (69.6713, 27.5195) -> (58.3003, 20.9544) projected
  arc A63 (60.9667, 11.0031) -> (58.3003, 20.9544) centre (0, 0) ccw projected
extrude "Extrusion13" add sketch "Sketch10" along normal blind 10
fillet "Fillet2" radius 2 12 edges at (20.75, -140, 51.9615) (42.7115, -140, 30) (50.75, -140, 0) (42.7115, -140, -30) (20.75, -140, -51.9615) (-9.25, -140, -60) (-39.25, -140, -51.9615) (-9.25, -140, 60) (-39.25, -140, 51.9615) (-61.2115, -140, 30) (-69.25, -140, 0) (-61.2115, -140, -30)
sketch "Sketch11" plane through (0, 0, 0) normal (0, -1, 0) x (1, 0, 0)
  circle A0 centre (0, 0) radius 5 projected
  circle A1 centre (0, 0) radius 112.976
extrude "Extrusion14" cut sketch "Sketch11" along normal up to surface (150 mm away) contours A0 | A1
sketch "Sketch12" plane through (0, 0, 0) normal (0, -1, 0) x (1, 0, 0)
  circle A0 centre (0, 0) radius 5 projected
  circle A1 centre (0, 0) radius 106.9123
extrude "Extrusion15" [suppressed]
ref_plane "Work Plane2" through (0, 0, 45) normal (0, 0, 1) x (1, 0, 0)
sketch "Sketch13" plane through (0, 0, 45) normal (0, 0, 1) x (1, 0, 0)
  line L0 (-3.558, -4.097) -> (4.442, -4.097)
  line L1 (4.442, -4.097) -> (4.442, -26.105)
  line L2 (4.442, -26.105) -> (-3.558, -26.105)
  line L3 (-3.558, -26.105) -> (-3.558, -4.097)
  line L4 (45, 0) -> (-45, 0) projected
  point P0 (0, 0)
  dimension "d114" = 8
  dimension "d115" = 3.558
  dimension "d116" = 4.097
  dimension "d117" = 22.008
ref_plane "Work Plane3" through (-45, 0, 0) normal (1, 0, 0) x (0, 1, 0)
properties part number "12 Test Tube Rack"
